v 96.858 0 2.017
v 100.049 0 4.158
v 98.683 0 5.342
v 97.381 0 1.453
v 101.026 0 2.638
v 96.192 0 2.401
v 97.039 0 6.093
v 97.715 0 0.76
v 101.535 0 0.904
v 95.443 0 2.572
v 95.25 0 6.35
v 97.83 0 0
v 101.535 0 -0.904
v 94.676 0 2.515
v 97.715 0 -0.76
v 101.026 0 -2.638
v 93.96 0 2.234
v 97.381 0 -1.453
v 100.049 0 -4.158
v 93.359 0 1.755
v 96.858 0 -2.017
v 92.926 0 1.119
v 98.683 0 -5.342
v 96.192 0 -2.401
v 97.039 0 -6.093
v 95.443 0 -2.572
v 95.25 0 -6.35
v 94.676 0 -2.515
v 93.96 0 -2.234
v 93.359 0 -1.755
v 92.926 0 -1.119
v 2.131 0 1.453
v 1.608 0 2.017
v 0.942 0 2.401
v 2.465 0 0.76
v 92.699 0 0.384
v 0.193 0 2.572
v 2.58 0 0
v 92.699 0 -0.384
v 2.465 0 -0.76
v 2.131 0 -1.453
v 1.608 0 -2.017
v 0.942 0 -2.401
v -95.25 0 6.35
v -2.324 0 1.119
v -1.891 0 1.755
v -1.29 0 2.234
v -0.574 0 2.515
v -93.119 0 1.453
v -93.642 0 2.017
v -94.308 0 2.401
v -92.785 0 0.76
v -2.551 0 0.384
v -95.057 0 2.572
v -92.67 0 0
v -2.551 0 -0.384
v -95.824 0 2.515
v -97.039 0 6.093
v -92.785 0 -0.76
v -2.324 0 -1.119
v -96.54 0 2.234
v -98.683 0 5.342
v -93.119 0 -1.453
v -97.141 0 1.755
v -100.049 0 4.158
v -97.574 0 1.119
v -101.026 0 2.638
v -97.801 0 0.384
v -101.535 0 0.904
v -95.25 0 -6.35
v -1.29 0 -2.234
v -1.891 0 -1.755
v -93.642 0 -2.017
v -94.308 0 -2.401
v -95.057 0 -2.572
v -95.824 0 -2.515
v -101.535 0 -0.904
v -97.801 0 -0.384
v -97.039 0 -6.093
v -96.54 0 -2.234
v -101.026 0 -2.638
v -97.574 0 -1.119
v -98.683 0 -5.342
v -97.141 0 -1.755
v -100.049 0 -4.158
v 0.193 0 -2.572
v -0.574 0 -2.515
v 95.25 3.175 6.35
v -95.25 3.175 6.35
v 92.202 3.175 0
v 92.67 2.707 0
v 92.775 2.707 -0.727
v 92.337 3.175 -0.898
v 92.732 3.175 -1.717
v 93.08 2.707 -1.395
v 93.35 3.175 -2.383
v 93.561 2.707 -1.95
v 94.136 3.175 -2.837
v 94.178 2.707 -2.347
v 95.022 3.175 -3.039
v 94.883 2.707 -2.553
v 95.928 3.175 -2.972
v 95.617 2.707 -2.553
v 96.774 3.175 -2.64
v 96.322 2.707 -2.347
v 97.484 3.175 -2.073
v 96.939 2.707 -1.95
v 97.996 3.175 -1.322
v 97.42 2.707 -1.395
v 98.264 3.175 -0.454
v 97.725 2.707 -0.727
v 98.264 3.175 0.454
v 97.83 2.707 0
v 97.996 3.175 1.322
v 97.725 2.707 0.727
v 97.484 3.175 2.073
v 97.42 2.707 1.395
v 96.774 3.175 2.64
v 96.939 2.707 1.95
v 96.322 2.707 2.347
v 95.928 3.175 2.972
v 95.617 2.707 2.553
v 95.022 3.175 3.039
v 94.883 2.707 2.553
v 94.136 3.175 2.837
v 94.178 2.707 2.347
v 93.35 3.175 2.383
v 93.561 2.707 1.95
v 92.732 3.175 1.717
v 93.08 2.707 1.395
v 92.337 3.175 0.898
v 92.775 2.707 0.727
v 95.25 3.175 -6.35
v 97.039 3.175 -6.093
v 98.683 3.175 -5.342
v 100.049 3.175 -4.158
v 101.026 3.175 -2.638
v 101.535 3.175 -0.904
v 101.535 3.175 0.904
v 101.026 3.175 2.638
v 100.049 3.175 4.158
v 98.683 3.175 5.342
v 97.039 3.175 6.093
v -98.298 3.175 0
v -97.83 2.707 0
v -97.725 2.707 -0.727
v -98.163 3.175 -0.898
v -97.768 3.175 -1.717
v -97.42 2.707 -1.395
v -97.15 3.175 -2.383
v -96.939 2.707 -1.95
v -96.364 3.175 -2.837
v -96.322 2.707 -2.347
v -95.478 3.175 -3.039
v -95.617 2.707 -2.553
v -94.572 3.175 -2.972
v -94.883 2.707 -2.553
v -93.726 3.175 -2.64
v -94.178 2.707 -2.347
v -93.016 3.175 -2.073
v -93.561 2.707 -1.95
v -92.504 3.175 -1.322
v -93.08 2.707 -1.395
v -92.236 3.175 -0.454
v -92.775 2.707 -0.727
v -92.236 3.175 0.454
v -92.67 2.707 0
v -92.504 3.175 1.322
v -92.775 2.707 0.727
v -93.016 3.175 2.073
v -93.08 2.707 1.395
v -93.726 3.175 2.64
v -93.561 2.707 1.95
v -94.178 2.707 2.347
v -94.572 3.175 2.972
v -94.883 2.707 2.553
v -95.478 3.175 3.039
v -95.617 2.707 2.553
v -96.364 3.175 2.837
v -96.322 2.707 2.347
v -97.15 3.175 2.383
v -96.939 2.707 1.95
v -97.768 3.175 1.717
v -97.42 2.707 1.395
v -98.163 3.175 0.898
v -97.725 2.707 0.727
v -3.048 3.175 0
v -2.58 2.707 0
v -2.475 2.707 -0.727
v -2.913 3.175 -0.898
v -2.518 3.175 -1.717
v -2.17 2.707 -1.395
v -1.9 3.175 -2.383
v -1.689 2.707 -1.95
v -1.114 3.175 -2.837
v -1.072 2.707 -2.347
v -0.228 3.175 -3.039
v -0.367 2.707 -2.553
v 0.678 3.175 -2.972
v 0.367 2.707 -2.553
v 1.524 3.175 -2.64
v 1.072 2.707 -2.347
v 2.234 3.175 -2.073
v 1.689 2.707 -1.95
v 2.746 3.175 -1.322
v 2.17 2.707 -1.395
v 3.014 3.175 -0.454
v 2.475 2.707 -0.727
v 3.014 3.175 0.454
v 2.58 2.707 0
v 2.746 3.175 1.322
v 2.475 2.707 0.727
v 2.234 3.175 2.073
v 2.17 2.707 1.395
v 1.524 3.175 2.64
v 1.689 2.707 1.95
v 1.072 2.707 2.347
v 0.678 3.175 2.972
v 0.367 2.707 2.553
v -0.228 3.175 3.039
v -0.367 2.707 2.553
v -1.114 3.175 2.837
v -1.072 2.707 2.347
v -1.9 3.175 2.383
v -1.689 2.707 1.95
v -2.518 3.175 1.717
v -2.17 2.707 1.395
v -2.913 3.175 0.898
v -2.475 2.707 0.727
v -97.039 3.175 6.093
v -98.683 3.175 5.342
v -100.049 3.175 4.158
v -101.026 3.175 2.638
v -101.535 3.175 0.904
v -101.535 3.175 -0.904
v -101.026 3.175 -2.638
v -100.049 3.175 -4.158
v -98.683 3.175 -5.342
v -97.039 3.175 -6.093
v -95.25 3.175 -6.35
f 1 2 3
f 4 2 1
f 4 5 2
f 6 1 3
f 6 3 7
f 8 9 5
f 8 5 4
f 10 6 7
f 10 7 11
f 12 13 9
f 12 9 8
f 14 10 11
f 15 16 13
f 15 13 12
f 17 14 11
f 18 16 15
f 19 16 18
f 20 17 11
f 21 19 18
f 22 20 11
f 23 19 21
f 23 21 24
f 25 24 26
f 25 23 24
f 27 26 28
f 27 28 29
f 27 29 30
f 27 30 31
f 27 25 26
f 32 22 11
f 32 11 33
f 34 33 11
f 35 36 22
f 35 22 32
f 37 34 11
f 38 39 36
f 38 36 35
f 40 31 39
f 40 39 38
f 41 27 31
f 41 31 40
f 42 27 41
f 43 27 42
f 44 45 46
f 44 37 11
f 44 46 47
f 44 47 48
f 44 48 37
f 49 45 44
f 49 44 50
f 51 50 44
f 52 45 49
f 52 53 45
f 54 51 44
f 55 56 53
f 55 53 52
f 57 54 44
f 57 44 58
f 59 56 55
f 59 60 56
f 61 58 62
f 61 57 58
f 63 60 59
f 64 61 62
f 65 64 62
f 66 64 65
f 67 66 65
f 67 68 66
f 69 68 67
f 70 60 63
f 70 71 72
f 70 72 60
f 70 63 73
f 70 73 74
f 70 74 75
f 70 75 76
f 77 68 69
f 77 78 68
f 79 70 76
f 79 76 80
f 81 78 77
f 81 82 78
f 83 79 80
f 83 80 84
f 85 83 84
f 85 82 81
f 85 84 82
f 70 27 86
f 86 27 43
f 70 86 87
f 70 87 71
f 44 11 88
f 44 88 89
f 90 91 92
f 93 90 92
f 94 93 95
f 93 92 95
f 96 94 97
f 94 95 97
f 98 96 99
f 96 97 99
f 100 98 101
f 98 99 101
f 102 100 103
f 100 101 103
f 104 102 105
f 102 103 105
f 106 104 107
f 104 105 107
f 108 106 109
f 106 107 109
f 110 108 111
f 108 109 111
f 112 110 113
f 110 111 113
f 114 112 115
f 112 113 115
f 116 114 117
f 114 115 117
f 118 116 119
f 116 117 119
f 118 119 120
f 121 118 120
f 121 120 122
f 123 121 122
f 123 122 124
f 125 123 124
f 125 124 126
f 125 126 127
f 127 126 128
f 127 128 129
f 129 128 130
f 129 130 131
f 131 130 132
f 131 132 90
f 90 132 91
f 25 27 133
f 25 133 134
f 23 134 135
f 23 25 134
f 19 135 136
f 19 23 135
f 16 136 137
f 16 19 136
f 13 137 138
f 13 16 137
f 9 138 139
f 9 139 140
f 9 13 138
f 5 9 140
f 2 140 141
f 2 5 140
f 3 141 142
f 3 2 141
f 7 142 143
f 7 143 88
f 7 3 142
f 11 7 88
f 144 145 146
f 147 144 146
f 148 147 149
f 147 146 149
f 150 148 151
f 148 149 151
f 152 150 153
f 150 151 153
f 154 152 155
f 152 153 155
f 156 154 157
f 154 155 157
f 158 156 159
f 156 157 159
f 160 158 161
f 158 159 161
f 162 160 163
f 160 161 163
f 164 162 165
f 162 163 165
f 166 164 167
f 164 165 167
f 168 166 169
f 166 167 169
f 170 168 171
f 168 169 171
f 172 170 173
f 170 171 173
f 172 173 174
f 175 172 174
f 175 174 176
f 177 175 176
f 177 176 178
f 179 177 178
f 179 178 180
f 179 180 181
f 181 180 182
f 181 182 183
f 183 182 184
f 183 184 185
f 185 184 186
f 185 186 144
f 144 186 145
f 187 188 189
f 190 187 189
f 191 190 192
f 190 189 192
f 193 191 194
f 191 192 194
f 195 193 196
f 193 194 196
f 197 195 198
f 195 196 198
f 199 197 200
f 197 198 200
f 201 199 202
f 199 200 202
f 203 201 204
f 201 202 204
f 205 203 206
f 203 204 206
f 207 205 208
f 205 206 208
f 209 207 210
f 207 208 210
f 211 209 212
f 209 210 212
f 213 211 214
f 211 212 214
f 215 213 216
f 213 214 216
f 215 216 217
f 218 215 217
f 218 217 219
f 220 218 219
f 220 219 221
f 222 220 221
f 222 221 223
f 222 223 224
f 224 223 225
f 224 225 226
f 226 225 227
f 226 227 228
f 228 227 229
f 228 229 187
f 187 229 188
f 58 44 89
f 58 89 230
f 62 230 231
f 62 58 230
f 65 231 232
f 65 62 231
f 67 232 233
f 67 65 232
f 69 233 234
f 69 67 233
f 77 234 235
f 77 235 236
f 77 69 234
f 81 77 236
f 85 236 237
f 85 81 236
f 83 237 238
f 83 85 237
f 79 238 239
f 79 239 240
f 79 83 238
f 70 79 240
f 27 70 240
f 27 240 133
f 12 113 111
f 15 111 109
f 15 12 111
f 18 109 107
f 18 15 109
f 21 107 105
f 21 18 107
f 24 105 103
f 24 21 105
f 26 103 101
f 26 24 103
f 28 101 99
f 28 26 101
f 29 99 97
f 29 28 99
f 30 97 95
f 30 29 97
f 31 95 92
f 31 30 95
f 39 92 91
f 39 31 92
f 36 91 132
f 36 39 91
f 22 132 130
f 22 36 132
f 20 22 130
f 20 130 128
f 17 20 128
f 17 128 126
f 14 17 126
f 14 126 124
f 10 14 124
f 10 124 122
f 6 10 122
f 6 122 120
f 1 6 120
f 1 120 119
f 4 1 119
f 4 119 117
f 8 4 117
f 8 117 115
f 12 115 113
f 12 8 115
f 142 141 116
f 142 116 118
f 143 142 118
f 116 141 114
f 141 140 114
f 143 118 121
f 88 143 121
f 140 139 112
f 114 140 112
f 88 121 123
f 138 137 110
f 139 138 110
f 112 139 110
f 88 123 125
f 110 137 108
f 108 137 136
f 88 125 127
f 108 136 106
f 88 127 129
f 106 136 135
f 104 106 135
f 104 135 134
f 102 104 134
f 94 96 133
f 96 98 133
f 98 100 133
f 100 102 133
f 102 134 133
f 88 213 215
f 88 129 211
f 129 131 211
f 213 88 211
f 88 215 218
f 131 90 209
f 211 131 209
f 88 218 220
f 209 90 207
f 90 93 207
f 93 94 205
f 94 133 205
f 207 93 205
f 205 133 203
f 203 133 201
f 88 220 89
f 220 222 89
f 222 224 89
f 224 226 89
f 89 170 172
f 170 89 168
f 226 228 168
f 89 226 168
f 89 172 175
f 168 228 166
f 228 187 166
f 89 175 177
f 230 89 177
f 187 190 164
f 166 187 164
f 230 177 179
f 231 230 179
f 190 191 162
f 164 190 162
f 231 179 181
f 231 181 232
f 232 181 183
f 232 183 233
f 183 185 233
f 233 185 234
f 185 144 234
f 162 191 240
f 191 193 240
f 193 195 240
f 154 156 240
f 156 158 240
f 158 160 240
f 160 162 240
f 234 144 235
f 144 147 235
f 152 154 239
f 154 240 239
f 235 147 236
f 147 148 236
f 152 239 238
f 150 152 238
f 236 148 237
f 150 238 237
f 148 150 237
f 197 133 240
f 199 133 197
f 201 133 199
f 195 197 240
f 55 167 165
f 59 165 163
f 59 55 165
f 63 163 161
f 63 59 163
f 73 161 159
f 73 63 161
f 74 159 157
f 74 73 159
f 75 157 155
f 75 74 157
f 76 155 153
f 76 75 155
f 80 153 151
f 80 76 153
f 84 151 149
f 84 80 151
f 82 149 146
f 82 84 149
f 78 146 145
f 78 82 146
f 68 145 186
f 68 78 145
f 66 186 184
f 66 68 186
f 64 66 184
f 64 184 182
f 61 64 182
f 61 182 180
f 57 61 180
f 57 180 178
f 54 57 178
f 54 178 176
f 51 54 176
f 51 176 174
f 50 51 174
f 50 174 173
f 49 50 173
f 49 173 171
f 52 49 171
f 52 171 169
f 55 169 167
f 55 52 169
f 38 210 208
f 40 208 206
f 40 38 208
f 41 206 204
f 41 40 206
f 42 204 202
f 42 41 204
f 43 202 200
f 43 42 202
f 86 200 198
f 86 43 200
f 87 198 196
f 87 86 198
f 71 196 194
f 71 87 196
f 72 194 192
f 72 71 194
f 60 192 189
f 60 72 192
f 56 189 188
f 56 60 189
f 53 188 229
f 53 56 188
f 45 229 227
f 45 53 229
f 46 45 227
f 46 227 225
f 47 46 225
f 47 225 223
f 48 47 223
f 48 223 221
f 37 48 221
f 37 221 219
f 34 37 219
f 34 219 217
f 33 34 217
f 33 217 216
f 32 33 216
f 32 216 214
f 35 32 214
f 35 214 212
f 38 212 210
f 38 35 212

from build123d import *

# Parameters (mm, degrees)
SKETCH1_R                        = 2.5796875
BOSS_EXTRUDE1_DEPTH              = 3.175
F_10_32_TAPPED_HOLE1_D           = 4.0386
F_10_32_TAPPED_HOLE1_CSINK_D     = 6.096
F_10_32_TAPPED_HOLE1_CSINK_ANGLE = 90


with BuildPart() as part:
    # Sketch1 → Boss-Extrude1 (new body)
    with BuildSketch(Plane(origin=(0, 0, 0), x_dir=(1, 0, 0), z_dir=(0, 1, 0))):
        with BuildLine():
            Line((-95.25, 6.35), (95.25, 6.35))
            ThreePointArc((95.25, 6.35), (101.6, 0), (95.25, -6.35))
            Line((95.25, -6.35), (-95.25, -6.35))
            ThreePointArc((-95.25, -6.35), (-101.6, 0), (-95.25, 6.35))
        make_face()
        with Locations((95.25, 0)):
            Circle(SKETCH1_R, mode=Mode.SUBTRACT)
        with Locations((-95.25, 0)):
            Circle(SKETCH1_R, mode=Mode.SUBTRACT)
        Circle(SKETCH1_R, mode=Mode.SUBTRACT)
    extrude(amount=BOSS_EXTRUDE1_DEPTH)

    # #10-32 Tapped Hole1 (through all)
    with Locations(Plane(origin=(0, 3.175, 0), x_dir=(1, 0, 0), z_dir=(0, 1, 0))):
        with Locations((-95.25, 0), (0, 0), (95.25, 0)):
            CounterSinkHole(F_10_32_TAPPED_HOLE1_D / 2, F_10_32_TAPPED_HOLE1_CSINK_D / 2, counter_sink_angle=F_10_32_TAPPED_HOLE1_CSINK_ANGLE)


solid = part.part
